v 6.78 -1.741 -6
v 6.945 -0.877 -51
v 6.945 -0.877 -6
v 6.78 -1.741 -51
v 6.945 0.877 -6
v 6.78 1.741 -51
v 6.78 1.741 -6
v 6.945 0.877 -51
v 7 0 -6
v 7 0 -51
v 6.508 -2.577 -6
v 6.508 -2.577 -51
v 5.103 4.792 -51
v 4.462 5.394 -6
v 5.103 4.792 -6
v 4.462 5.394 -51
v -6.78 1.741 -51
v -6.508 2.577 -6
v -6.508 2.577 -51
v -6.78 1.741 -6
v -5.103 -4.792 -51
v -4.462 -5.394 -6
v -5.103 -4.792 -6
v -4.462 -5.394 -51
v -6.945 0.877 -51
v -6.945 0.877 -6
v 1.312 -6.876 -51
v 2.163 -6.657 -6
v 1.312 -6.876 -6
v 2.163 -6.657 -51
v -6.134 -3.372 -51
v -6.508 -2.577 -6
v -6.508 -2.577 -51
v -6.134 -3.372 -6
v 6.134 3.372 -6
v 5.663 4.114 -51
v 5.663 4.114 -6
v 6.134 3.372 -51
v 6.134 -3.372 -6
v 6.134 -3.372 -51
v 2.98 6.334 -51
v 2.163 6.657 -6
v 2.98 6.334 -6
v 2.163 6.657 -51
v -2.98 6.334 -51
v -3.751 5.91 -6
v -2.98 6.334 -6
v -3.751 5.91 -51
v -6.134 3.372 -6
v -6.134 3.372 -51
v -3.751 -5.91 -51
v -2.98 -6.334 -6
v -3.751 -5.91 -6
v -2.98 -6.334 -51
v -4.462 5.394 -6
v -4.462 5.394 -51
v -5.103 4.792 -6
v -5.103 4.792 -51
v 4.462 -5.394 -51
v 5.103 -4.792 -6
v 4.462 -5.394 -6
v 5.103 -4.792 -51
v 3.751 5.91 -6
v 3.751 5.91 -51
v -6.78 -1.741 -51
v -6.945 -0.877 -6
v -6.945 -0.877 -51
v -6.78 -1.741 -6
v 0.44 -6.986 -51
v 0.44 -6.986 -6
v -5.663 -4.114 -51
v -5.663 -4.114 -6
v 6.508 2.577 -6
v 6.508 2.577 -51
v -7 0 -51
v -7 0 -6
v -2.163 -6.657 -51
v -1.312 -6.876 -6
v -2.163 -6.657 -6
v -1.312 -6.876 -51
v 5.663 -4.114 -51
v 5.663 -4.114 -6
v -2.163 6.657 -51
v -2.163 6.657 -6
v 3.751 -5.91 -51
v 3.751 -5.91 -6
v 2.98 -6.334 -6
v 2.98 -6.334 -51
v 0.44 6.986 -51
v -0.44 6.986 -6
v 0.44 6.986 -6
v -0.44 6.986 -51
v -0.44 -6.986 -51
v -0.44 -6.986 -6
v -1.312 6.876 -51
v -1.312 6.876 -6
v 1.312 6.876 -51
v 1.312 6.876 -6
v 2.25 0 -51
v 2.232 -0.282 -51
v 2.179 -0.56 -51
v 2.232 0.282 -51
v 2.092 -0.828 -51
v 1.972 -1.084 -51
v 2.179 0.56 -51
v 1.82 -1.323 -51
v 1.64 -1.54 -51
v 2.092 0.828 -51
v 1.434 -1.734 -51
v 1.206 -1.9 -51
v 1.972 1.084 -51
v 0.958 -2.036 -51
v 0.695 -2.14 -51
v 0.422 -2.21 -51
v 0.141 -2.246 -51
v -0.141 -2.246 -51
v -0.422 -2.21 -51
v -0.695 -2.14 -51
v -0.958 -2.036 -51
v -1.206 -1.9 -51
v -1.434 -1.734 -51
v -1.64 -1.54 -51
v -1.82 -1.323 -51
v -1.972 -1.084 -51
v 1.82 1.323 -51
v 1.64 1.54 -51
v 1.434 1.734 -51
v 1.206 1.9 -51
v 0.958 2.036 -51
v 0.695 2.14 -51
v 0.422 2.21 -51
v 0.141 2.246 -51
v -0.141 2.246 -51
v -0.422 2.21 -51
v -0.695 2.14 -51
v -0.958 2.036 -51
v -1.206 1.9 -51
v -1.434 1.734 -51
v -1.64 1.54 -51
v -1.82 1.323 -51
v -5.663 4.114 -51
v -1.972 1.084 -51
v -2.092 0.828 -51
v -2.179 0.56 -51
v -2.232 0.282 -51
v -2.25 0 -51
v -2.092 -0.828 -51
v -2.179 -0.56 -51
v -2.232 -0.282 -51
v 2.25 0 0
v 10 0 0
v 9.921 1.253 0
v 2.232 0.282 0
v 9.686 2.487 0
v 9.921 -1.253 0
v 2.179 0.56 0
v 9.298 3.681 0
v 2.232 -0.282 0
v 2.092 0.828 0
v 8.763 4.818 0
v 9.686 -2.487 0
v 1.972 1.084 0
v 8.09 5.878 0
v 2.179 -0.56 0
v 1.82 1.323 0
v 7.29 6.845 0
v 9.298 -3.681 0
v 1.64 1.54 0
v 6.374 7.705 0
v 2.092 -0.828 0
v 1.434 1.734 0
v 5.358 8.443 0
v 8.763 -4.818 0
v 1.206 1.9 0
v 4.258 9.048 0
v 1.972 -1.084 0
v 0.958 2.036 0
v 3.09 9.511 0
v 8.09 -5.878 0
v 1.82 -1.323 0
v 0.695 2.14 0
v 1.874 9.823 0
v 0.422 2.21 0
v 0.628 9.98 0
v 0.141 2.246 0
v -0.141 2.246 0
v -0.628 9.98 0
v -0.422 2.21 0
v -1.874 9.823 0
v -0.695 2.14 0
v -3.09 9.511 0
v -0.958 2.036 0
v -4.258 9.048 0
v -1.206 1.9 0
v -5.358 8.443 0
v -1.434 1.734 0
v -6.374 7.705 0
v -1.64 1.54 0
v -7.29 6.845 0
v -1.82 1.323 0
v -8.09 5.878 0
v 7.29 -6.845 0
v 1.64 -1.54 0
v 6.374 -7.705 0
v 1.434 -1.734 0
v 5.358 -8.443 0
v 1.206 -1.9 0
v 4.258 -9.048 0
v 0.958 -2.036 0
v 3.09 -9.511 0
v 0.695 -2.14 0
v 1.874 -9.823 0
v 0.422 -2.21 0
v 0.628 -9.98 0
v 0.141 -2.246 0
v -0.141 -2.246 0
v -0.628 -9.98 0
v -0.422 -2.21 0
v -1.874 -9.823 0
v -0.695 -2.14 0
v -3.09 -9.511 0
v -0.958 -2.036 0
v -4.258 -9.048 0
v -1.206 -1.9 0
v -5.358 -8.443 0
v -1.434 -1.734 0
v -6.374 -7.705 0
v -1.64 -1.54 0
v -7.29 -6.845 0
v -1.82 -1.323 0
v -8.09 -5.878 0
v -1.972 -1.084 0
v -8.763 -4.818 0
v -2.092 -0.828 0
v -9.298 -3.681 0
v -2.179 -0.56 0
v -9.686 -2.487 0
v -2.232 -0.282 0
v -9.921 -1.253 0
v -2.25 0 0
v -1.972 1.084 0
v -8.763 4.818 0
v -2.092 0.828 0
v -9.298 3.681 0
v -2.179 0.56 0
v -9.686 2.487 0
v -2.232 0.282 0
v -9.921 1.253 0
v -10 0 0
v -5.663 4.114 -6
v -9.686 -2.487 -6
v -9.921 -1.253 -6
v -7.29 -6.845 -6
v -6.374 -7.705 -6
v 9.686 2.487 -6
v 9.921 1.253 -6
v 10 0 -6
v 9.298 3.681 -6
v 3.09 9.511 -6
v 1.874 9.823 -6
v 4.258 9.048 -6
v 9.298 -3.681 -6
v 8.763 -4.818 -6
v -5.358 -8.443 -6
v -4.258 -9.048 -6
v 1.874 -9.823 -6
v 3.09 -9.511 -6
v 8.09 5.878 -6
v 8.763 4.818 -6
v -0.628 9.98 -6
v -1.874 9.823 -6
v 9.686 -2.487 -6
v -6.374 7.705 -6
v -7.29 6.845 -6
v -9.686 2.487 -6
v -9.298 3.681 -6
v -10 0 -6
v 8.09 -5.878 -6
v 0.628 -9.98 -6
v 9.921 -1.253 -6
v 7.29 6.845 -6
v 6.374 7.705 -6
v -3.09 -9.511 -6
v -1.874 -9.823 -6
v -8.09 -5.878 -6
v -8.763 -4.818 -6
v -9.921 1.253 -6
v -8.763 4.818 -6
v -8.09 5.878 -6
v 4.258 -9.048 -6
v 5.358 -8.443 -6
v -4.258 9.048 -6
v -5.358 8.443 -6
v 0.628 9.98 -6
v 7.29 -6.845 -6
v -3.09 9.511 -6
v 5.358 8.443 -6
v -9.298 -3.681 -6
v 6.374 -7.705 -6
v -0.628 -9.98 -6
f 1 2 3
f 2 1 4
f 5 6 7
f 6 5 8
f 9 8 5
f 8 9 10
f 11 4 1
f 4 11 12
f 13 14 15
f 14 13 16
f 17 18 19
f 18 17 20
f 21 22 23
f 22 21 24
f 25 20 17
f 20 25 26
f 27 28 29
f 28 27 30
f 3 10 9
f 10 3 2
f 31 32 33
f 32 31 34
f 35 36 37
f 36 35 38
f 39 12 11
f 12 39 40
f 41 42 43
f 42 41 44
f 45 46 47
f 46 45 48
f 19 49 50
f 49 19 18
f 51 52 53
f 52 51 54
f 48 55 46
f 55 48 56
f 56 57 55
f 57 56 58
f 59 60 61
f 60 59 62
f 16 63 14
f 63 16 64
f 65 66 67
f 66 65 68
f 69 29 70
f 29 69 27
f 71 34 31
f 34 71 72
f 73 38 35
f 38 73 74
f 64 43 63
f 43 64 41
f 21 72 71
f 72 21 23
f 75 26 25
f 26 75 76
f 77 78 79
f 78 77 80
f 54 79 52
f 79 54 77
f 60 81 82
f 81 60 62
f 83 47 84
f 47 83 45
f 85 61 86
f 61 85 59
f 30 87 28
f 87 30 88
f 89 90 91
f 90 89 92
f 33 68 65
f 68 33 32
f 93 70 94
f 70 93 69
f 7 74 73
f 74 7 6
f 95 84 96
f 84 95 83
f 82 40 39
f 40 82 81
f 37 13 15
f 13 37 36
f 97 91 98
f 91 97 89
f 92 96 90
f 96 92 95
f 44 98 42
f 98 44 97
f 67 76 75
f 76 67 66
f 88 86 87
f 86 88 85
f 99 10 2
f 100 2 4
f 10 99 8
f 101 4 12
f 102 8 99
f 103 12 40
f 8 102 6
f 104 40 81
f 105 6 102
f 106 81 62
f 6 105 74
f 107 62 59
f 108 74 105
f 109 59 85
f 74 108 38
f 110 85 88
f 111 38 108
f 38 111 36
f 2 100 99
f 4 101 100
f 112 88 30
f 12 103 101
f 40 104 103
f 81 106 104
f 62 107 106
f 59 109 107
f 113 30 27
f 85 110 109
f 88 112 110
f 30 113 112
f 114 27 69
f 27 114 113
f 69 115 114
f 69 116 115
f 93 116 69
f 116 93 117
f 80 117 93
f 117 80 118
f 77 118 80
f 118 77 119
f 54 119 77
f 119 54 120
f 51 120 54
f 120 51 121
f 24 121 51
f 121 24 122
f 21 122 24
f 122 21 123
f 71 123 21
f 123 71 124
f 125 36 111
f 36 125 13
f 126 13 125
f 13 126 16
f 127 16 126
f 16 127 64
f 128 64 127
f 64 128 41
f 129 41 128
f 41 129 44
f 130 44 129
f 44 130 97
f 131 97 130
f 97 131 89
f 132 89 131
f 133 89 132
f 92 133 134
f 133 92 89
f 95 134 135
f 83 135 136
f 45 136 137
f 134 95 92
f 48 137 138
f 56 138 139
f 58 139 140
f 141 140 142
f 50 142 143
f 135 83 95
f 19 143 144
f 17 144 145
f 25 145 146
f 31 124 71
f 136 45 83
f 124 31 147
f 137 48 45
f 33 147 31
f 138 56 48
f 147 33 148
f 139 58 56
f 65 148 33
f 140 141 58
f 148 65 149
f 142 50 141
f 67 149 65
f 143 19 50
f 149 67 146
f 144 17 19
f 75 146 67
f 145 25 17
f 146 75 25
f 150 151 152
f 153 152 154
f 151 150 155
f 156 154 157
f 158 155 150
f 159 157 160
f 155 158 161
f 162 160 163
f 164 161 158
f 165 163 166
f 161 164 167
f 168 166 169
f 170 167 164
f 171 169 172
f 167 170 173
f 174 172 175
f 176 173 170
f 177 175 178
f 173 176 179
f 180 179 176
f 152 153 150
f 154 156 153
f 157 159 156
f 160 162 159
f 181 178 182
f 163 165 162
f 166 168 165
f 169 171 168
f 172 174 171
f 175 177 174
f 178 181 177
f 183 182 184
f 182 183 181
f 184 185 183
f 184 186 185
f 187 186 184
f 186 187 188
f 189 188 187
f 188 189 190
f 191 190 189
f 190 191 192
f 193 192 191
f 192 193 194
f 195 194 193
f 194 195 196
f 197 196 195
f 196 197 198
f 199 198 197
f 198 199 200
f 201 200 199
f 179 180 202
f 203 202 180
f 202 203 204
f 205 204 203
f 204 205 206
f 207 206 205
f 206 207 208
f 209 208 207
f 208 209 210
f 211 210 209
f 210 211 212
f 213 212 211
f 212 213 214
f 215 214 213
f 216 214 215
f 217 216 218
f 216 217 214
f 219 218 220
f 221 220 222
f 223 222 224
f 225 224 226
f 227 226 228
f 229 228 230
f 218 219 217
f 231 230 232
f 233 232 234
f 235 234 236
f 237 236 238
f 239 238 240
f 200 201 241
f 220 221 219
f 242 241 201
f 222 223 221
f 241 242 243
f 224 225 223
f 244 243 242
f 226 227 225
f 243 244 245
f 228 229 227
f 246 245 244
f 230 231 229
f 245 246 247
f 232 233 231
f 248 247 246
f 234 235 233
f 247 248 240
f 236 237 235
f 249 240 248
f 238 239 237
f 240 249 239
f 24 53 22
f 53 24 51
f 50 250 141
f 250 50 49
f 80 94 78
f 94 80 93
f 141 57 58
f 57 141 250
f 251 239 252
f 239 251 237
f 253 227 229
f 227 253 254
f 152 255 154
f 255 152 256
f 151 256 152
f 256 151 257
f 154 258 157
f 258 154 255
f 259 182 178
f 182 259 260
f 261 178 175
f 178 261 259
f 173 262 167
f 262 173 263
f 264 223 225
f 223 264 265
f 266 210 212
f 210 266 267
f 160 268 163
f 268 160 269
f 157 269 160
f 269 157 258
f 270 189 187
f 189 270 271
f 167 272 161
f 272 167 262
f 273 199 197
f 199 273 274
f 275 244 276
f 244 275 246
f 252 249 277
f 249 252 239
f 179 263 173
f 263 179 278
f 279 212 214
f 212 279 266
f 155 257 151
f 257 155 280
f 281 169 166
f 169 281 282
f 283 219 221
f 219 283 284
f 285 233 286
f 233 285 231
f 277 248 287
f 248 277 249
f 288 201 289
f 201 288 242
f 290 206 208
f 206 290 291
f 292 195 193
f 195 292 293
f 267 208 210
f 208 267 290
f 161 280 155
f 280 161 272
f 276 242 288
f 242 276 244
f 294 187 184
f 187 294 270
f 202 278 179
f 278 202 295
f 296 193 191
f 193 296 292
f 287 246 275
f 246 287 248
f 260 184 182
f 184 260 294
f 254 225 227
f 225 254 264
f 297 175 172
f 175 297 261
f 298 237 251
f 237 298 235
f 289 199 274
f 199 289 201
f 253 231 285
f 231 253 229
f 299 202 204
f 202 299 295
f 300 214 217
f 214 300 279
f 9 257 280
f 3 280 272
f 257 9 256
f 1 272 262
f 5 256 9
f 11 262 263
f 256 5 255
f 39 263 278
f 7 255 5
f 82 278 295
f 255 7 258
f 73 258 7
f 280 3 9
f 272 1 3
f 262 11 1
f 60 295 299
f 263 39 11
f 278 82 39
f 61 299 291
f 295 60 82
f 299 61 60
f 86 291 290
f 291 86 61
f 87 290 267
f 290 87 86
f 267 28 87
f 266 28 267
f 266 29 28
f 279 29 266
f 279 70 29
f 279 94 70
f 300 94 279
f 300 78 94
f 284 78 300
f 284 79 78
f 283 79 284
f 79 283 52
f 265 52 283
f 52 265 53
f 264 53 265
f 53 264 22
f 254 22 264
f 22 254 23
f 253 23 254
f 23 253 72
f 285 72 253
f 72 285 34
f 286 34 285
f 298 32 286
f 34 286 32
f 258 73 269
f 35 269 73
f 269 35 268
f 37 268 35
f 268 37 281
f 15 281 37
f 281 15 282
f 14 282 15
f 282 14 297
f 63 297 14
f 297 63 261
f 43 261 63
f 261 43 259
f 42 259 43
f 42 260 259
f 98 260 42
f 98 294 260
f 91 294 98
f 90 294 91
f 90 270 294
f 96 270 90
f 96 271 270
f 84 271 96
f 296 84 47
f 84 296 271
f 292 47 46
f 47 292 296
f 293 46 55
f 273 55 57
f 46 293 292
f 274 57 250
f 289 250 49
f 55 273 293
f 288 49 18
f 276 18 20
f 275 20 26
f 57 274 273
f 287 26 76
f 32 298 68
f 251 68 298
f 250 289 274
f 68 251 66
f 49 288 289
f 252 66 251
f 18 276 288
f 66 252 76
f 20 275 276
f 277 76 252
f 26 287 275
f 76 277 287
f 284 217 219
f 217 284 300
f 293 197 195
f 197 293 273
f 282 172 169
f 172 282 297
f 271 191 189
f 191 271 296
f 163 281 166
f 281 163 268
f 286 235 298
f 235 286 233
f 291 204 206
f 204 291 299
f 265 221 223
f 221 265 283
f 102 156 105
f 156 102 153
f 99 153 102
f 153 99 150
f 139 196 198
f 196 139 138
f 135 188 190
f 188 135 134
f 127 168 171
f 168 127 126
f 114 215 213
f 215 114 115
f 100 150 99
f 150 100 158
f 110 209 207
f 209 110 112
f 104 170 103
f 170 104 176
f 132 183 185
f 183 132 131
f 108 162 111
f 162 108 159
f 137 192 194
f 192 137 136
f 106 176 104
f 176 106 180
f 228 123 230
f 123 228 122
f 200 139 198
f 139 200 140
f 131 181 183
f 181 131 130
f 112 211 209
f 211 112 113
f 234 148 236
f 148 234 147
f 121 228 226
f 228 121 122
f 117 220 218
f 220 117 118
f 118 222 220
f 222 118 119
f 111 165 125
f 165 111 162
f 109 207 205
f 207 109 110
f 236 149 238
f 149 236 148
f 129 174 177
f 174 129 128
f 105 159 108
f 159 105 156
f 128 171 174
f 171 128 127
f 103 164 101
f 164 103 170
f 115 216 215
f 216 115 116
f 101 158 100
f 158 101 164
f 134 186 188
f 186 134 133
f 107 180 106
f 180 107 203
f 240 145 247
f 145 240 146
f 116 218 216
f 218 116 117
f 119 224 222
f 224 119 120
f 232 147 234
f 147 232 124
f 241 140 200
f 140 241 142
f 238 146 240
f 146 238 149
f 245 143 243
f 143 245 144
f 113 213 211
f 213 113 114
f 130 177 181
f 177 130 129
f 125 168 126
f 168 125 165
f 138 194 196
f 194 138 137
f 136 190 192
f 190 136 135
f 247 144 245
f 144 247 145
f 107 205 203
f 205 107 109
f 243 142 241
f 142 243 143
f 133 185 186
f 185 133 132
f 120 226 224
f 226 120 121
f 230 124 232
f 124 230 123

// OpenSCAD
$fn = 50;


difference() {
	union() {
		translate(v = [0, 0, -51.0000000000]) {
			cylinder(h = 51, r = 7.0000000000);
		}
		translate(v = [0, 0, -6.0000000000]) {
			cylinder(h = 6, r = 10.0000000000);
		}
	}
	union() {
		#translate(v = [0, 0, -51]) {
			cylinder(h = 51, r = 2.2500000000);
		}
	}
}
